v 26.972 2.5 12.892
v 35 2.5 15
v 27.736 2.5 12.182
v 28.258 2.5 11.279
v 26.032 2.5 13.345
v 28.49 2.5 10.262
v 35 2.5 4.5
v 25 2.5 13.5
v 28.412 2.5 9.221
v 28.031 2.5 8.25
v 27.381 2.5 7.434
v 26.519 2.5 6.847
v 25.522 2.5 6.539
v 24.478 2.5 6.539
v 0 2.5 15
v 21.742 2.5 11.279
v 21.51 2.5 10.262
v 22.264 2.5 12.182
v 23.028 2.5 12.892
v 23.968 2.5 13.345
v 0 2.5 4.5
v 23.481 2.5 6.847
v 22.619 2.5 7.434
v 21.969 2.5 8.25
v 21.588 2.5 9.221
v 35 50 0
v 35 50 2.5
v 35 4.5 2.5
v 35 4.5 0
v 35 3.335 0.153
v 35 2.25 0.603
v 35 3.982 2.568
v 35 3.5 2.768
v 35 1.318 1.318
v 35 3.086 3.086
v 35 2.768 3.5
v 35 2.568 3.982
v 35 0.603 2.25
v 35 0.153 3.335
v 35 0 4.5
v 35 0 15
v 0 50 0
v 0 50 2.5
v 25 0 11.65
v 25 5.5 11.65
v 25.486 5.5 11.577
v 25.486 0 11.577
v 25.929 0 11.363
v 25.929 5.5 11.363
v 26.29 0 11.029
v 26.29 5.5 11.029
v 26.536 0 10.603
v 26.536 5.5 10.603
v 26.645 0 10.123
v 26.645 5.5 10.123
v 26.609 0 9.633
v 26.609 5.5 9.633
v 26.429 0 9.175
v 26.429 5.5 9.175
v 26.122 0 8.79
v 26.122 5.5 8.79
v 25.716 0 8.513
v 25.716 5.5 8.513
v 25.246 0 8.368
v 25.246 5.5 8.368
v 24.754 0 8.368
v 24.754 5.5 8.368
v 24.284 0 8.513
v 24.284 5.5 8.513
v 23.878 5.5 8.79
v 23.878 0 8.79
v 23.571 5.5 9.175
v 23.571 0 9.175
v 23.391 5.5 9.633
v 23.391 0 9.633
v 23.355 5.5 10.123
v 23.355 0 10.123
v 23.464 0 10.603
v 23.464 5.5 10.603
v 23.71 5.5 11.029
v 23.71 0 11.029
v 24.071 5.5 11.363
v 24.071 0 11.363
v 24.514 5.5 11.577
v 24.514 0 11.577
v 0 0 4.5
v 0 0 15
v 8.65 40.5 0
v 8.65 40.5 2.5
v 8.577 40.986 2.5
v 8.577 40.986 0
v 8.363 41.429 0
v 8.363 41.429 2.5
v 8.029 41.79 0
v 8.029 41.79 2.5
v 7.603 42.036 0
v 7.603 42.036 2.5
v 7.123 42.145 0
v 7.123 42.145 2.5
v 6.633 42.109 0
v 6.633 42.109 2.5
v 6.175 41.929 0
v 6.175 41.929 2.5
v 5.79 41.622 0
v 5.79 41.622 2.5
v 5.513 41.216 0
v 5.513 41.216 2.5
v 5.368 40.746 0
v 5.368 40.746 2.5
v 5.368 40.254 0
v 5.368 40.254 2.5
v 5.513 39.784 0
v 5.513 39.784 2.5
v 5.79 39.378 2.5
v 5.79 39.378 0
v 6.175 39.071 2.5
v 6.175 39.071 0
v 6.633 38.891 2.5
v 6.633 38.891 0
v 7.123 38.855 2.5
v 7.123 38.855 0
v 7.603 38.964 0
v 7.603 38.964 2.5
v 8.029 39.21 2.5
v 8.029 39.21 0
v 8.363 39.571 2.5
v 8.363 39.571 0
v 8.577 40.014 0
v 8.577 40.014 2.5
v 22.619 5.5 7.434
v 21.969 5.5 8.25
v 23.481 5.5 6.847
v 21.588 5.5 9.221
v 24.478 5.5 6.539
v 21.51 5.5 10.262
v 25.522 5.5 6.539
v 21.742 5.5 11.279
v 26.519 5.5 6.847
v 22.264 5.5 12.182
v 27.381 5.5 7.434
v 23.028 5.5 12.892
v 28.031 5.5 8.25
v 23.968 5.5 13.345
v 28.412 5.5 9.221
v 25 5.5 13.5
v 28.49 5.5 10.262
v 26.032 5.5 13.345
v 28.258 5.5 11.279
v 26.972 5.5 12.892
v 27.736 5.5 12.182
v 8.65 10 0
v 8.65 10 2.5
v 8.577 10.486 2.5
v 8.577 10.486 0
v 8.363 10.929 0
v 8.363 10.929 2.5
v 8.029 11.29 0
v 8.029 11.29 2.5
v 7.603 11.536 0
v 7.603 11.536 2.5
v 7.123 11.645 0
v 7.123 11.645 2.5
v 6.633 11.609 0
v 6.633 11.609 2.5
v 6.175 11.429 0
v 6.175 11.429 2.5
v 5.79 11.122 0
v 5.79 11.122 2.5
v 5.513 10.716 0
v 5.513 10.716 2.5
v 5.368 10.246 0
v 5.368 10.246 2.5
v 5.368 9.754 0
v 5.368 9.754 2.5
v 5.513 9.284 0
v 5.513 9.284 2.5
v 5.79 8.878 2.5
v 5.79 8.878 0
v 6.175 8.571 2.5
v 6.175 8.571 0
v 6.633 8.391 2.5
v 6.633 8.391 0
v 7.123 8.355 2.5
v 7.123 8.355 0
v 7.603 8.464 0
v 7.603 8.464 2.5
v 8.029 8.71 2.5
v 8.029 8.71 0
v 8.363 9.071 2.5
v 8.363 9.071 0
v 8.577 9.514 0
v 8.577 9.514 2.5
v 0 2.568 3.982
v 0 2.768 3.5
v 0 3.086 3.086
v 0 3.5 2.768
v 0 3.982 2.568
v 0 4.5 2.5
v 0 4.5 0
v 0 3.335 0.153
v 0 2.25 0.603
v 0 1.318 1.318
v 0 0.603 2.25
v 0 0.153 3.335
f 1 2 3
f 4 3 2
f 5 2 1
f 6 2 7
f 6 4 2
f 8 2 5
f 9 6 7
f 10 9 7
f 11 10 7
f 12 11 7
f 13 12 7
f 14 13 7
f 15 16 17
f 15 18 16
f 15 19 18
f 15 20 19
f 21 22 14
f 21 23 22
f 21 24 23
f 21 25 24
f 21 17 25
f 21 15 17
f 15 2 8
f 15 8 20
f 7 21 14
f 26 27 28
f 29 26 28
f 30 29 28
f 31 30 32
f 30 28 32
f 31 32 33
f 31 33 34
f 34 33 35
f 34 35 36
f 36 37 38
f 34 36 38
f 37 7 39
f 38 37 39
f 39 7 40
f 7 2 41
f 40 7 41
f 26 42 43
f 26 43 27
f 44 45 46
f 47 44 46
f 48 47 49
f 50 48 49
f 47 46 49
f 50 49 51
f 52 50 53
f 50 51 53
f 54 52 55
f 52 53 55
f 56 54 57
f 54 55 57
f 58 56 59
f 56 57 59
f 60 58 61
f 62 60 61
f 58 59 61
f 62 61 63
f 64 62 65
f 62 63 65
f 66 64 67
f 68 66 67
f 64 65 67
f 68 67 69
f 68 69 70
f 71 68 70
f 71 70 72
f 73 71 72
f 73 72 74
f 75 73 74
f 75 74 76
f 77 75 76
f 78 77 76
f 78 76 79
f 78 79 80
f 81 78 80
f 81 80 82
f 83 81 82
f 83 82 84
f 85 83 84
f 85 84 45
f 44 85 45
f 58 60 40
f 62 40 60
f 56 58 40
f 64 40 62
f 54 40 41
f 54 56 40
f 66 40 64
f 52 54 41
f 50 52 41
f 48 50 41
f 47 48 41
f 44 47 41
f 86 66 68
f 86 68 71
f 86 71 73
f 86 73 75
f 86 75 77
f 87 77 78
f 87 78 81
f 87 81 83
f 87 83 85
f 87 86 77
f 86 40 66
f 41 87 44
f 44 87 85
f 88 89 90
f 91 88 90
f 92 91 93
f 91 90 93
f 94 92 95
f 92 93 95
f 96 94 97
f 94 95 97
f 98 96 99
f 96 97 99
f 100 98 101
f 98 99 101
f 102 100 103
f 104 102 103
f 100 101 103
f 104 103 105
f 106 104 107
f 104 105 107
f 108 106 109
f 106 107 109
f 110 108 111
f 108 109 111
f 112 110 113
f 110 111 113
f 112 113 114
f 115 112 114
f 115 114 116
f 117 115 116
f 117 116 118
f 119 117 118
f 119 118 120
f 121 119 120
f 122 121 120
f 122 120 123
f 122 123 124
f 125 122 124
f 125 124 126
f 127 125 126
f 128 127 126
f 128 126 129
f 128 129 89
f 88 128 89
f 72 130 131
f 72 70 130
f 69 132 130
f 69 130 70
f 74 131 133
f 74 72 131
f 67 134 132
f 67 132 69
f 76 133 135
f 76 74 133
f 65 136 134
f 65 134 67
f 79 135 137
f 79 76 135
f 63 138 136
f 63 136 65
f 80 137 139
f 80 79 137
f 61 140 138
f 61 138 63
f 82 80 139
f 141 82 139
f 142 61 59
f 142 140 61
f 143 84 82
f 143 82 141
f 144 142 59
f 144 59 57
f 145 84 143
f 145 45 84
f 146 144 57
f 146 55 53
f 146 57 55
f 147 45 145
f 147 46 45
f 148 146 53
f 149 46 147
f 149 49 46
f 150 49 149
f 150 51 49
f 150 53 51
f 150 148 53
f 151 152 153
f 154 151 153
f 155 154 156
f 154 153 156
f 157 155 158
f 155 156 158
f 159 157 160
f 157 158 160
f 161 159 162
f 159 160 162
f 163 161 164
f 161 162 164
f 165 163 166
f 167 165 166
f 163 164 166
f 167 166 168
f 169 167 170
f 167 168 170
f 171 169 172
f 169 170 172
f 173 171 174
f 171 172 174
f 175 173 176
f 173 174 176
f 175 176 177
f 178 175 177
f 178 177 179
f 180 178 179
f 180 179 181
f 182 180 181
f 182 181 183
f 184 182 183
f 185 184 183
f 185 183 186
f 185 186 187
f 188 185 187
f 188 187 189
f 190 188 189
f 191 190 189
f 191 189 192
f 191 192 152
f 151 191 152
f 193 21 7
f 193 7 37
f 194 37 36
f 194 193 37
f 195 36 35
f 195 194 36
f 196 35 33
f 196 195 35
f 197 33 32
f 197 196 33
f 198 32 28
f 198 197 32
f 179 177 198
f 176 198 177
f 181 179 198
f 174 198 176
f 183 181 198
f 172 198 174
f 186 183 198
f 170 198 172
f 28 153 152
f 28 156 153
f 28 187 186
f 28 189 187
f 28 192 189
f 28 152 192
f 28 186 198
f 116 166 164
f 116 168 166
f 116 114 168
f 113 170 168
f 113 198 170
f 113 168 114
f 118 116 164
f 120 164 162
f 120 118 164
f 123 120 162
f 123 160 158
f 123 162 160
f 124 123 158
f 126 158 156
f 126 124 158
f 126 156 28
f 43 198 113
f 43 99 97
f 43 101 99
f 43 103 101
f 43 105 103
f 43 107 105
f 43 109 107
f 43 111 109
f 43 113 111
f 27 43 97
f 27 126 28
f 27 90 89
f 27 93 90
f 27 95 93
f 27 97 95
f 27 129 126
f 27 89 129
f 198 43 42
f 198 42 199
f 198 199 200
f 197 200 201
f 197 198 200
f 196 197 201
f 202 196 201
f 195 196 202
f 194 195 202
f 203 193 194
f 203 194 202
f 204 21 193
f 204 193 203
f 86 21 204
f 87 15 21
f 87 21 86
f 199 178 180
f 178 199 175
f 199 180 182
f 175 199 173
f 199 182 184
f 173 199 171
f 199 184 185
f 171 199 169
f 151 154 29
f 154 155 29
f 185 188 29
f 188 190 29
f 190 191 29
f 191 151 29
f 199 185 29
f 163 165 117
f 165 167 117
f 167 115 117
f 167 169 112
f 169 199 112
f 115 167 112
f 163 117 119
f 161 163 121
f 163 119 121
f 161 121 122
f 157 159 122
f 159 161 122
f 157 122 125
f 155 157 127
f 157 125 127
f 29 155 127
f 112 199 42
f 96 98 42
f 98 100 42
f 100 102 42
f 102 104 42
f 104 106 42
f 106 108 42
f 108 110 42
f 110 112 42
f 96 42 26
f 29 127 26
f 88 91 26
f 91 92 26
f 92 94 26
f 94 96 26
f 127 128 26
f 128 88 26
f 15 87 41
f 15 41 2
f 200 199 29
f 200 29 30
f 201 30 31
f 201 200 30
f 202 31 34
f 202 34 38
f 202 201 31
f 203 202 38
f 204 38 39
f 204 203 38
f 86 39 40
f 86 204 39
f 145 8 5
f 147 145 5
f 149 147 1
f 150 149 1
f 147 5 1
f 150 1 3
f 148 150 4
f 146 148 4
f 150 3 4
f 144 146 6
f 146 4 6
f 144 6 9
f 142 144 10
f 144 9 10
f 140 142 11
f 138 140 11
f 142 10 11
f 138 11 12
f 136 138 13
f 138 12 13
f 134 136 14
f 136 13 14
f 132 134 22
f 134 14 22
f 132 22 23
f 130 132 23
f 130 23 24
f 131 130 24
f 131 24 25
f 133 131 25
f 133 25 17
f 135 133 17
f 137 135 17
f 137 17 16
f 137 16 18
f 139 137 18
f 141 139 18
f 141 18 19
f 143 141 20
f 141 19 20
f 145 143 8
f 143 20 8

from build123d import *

# Parameters (mm, degrees)
SKETCH_1_W                       = 35
SKETCH_1_H                       = 50
EXTRUDE_1_DEPTH                  = 2.5
SKETCH_2_R                       = 1.65
CUT_EXTRUDE_1_DEPTH              = 10
SM_EDGE_FLANGE_2_STRIP_W         = 14
SM_EDGE_FLANGE_2_STRIP_H         = 2.5
SM_EDGE_FLANGE_2_STRIP_CUT_DEPTH = 35
SM_EDGE_FLANGE_2_DEPTH           = 35
SKETCH_19_R                      = 3.5
EXTRUDE_2_DEPTH                  = 3
SKETCH_20_R                      = 1.65
CUT_EXTRUDE_2_DEPTH              = 10


# Sheet-metal steps are written as plain solids
with BuildPart() as part:
    # 草图1 → 凸台-拉伸1 (new body)
    with BuildSketch(Plane.XY):
        with Locations((17.5, 25)):
            Rectangle(SKETCH_1_W, SKETCH_1_H)
    extrude(amount=EXTRUDE_1_DEPTH)

    # 草图2 → 切除-拉伸1 (cut)
    with BuildSketch(Plane.XY.offset(2.5)):
        with Locations((7, 40.5)):
            Circle(SKETCH_2_R)
        with Locations((7, 10)):
            Circle(SKETCH_2_R)
    extrude(amount=-CUT_EXTRUDE_1_DEPTH, mode=Mode.SUBTRACT)

    # 边线-法兰2 strip (across the edge) → 边线-法兰2 strip cut (cut)
    with BuildSketch(Plane(origin=(0, 0, 2.5), x_dir=(0, 1, 0), z_dir=(1, 0, 0))):
        with Locations((-2.5, -1.25)):
            Rectangle(SM_EDGE_FLANGE_2_STRIP_W, SM_EDGE_FLANGE_2_STRIP_H)
    extrude(amount=SM_EDGE_FLANGE_2_STRIP_CUT_DEPTH, mode=Mode.SUBTRACT)

    # 边线-法兰2 section (across the edge) → 边线-法兰2 (add)
    with BuildSketch(Plane(origin=(0, 0, 2.5), x_dir=(0, 1, 0), z_dir=(1, 0, 0))):
        with BuildLine():
            Line((0, 2), (0, 12.5))
            Line((0, 12.5), (2.5, 12.5))
            Line((2.5, 12.5), (2.5, 2))
            ThreePointArc((2.5, 2), (3.085786438, 0.585786438), (4.5, 0))
            Line((4.5, 0), (4.5, -2.5))
            ThreePointArc((4.5, -2.5), (1.318019485, -1.181980515), (0, 2))
        make_face()
    extrude(amount=SM_EDGE_FLANGE_2_DEPTH)

    # 草图19 → 凸台-拉伸2 (add)
    with BuildSketch(Plane(origin=(0, 2.5, 0), x_dir=(1, 0, 0), z_dir=(0, 1, 0))):
        with Locations(Location((25, -10, 0), (0, 0, 270))):
            Circle(SKETCH_19_R)
    extrude(amount=EXTRUDE_2_DEPTH)

    # 草图20 → 切除-拉伸2 (cut)
    with BuildSketch(Plane(origin=(0, 5.5, 0), x_dir=(1, 0, 0), z_dir=(0, 1, 0))):
        with Locations(Location((25, -10, 0), (0, 0, 270))):
            Circle(SKETCH_20_R)
    extrude(amount=-CUT_EXTRUDE_2_DEPTH, mode=Mode.SUBTRACT)


solid = part.part
